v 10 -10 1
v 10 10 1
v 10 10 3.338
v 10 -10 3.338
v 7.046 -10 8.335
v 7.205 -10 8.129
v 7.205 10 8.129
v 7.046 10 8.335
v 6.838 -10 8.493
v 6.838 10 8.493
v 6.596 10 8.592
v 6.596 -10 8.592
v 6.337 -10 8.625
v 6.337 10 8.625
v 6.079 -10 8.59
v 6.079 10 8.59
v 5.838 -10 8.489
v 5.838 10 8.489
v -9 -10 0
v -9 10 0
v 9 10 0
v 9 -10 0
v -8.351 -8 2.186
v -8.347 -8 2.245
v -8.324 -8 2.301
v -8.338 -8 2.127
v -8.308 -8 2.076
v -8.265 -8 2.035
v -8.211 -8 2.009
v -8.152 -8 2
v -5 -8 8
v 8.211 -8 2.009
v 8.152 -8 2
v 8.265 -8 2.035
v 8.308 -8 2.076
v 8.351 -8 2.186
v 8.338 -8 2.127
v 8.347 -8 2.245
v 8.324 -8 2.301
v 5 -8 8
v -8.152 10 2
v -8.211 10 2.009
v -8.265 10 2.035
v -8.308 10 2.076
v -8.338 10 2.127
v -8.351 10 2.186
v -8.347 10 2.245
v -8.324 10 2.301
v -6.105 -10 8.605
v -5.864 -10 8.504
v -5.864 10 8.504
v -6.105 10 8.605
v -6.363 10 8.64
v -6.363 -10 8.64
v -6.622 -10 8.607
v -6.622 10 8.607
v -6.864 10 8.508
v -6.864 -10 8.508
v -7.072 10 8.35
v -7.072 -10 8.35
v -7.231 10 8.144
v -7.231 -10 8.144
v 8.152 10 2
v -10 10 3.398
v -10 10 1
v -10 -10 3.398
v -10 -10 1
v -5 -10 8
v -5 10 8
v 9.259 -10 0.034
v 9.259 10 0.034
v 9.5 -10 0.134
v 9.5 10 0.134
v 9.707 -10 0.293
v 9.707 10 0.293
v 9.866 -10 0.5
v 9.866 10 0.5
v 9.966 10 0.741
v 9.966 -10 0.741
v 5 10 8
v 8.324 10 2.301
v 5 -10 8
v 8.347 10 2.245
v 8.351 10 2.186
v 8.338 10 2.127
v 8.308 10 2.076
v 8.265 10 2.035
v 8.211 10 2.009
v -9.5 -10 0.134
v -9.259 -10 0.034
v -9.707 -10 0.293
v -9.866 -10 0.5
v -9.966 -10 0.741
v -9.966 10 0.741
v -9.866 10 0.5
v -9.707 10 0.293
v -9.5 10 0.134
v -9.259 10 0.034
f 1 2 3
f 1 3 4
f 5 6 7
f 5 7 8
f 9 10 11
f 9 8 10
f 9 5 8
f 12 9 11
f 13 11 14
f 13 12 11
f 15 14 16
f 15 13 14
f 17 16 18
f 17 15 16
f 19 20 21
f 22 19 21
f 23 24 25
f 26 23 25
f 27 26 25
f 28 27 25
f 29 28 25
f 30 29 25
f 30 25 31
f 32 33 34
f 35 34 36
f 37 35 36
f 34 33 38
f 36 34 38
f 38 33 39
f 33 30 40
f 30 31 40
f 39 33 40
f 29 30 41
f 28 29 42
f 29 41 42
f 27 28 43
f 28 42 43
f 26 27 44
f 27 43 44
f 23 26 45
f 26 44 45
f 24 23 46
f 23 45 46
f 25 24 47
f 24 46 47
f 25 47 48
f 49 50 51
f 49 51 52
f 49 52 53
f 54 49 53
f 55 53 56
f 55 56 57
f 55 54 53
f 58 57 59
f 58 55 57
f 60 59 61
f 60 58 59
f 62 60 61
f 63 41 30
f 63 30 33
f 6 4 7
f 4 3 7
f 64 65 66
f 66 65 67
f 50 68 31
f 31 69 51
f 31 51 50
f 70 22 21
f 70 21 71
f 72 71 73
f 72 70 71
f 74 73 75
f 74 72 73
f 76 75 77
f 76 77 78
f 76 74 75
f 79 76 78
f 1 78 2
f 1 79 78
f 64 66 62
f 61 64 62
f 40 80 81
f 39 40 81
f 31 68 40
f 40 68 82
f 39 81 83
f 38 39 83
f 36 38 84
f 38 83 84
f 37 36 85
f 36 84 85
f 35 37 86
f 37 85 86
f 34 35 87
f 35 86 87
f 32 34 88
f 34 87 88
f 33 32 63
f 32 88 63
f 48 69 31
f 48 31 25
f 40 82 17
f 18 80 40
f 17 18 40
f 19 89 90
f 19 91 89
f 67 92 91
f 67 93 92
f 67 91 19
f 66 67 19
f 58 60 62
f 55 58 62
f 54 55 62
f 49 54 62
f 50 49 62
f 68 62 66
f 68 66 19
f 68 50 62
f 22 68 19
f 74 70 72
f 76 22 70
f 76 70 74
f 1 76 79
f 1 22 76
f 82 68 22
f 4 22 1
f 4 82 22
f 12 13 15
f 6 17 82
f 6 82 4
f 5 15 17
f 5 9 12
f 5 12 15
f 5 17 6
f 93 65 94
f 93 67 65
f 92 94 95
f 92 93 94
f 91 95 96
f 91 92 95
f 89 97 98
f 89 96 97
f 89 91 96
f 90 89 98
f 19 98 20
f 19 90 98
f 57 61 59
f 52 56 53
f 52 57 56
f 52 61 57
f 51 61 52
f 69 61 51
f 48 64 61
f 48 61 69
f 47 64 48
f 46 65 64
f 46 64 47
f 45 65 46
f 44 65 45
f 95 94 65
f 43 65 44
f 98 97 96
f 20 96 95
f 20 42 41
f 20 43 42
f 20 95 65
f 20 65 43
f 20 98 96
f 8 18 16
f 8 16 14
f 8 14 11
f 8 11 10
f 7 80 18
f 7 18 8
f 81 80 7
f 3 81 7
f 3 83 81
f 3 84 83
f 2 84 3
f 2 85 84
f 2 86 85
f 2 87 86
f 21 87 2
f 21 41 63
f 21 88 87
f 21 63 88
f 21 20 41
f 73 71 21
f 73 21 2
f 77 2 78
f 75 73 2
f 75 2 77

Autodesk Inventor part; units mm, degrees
ref_plane "YZ Plane" through (0, 0, 0) normal (1, 0, 0) x (0, 1, 0)
ref_plane "XZ Plane" through (0, 0, 0) normal (0, 1, 0) x (-1, 0, 0)
ref_plane "XY Plane" through (0, 0, 0) normal (0, 0, 1) x (1, 0, 0)
sketch "Sketch1" plane through (0, 0, 0) normal (0, 0, 1) x (1, 0, 0)
  line L0 (5, -10) -> (-5, -10)
  line L1 (-5, -10) -> (-5, 10)
  line L2 (-5, 10) -> (5, 10)
  line L3 (5, 10) -> (5, -10)
  line L4 (5, -10) -> (-5, 10) construction
  line L5 (-5, -10) -> (5, 10) construction
  point P0 (0, 0)
  dimension "d0" = 10
  dimension "d1" = 20
extrude "Extrusion1" add sketch "Sketch1" along normal blind 2
sketch "Sketch2" plane through (0, 0, 0) normal (0, 0, -1) x (-1, 0, 0)
  line L0 (-5, -10) -> (5, -10) construction
  line L1 (5, -10) -> (5, 10) construction
  line L2 (5, 10) -> (-5, 10) construction
  line L3 (-5, 10) -> (-5, -10) construction
  line L4 (-5, -10) -> (-5, 10) projected
  line L5 (-5, 10) -> (-10, 10)
  line L6 (-10, 10) -> (-10, -10)
  line L7 (-10, -10) -> (-5, -10)
  line L8 (-5, -10) -> (-5, 10)
  line L9 (5, 10) -> (5, -10) projected
  line L10 (5, 10) -> (10, 10)
  line L11 (10, 10) -> (10, -10)
  line L12 (10, -10) -> (5, -10)
  line L13 (5, -10) -> (5, 10)
  line L14 (5, -10) -> (-5, -10) projected
  point P0 (0, 0)
  dimension "d4" = 5
  dimension "d5" = 5
extrude "Extrusion2" add sketch "Sketch2" against normal blind 10
sketch "Sketch3" plane through (-10, 10, 0) normal (0, 1, 0) x (1, 0, 0)
  line L0 (0, 0) -> (20, 0) construction
  line L1 (0, 0) -> (0, -10) construction
  line L2 (5, -10) -> (0, -10) construction
  line L3 (5, -2) -> (5, -10) construction
  line L4 (15, -2) -> (5, -2) construction
  line L5 (15, -2) -> (15, -10) construction
  line L6 (20, -10) -> (15, -10) construction
  line L7 (20, 0) -> (20, -10) construction
  line L8 (5, -8) -> (1.6755, -2.3008)
  line L9 (1.8482, -2) -> (5, -2)
  line L10 (15, -8) -> (18.3245, -2.3008)
  line L11 (18.1518, -2) -> (15, -2)
  arc A0 (1.8482, -2) -> (1.6755, -2.3008) centre (1.8482, -2.2) ccw
  arc A1 (18.3245, -2.3008) -> (18.1518, -2) centre (18.1518, -2.2) ccw
  line L12 (5, -2) -> (5, -10) projected
  line L13 (5, -8) -> (5, -2)
  line L14 (15, -2) -> (15, -8)
  line L15 (15, -2) -> (15, -10) projected
  point P0 (10, 0)
  point P1 (1.5, -2)
  point P2 (18.5, -2)
  dimension "d9" = 2
  dimension "d10" = 3.5
  dimension "d11" = 3.5
  dimension "d12" = 2
  dimension "d13" = 0.2
extrude "Extrusion3" cut sketch "Sketch3" against normal through all
sketch "Sketch4" plane through (-10, 10, 0) normal (0, 1, 0) x (1, 0, 0)
  line L0 (0, -3.3978) -> (3.2724, -9.0077)
  line L1 (5, -10) -> (0, -10) projected
  line L2 (5, -8) -> (1.6755, -2.3008) projected
  line L3 (1.8482, -2) -> (18.1518, -2) projected
  line L4 (0, 0) -> (20, 0) projected
  line L5 (0, 0) -> (0, -10) projected
  line L6 (0, -3.3978) -> (0, -10)
  line L7 (20, -3.3381) -> (16.7016, -8.9926)
  line L8 (20, -10) -> (15, -10) projected
  line L9 (18.3245, -2.3008) -> (15, -8) projected
  line L10 (20, 0) -> (20, -10) projected
  line L11 (20, -3.3381) -> (20, -10)
  line L12 (5, -8) -> (3.2724, -9.0077)
  line L13 (15, -8) -> (15, -10) projected
  line L14 (15, -8) -> (16.7016, -8.9926)
  line L15 (5, -8) -> (5, -10) projected
  line L16 (5, -8) -> (5, -10)
  point P0 (10, 0)
  dimension "d16" = 2
  dimension "d17" = 2
extrude "Extrusion4" cut sketch "Sketch4" against normal through all
sketch "Sketch6" plane through (-10, -10, 0) normal (0, -1, 0) x (1, 0, 0)
  line L0 (1.6755, 2.3008) -> (5, 8) projected
  line L1 (18.1518, 2) -> (1.8482, 2) projected
  line L2 (15, 8) -> (18.3245, 2.3008) projected
  arc A0 (18.1518, 2) -> (18.3245, 2.3008) centre (18.1518, 2.2) ccw projected
  arc A1 (1.6755, 2.3008) -> (1.8482, 2) centre (1.8482, 2.2) ccw projected
  line L3 (3.2724, 9.0077) -> (5, 8) projected
  line L4 (5, 8) -> (15, 8)
  point P0 (10, 0)
extrude "Extrusion6" add sketch "Sketch6" against normal blind 2
fillet "Fillet1" [suppressed]
fillet "Fillet2" radius 1 4 edges at (6.7016, 0, 8.9926) (-10, 0, 0) (10, 0, 0) (-6.7276, 0, 9.0077)
equation "\"d11\" = d10"
equation "\"d12\" = d9"
properties part number "rail"
